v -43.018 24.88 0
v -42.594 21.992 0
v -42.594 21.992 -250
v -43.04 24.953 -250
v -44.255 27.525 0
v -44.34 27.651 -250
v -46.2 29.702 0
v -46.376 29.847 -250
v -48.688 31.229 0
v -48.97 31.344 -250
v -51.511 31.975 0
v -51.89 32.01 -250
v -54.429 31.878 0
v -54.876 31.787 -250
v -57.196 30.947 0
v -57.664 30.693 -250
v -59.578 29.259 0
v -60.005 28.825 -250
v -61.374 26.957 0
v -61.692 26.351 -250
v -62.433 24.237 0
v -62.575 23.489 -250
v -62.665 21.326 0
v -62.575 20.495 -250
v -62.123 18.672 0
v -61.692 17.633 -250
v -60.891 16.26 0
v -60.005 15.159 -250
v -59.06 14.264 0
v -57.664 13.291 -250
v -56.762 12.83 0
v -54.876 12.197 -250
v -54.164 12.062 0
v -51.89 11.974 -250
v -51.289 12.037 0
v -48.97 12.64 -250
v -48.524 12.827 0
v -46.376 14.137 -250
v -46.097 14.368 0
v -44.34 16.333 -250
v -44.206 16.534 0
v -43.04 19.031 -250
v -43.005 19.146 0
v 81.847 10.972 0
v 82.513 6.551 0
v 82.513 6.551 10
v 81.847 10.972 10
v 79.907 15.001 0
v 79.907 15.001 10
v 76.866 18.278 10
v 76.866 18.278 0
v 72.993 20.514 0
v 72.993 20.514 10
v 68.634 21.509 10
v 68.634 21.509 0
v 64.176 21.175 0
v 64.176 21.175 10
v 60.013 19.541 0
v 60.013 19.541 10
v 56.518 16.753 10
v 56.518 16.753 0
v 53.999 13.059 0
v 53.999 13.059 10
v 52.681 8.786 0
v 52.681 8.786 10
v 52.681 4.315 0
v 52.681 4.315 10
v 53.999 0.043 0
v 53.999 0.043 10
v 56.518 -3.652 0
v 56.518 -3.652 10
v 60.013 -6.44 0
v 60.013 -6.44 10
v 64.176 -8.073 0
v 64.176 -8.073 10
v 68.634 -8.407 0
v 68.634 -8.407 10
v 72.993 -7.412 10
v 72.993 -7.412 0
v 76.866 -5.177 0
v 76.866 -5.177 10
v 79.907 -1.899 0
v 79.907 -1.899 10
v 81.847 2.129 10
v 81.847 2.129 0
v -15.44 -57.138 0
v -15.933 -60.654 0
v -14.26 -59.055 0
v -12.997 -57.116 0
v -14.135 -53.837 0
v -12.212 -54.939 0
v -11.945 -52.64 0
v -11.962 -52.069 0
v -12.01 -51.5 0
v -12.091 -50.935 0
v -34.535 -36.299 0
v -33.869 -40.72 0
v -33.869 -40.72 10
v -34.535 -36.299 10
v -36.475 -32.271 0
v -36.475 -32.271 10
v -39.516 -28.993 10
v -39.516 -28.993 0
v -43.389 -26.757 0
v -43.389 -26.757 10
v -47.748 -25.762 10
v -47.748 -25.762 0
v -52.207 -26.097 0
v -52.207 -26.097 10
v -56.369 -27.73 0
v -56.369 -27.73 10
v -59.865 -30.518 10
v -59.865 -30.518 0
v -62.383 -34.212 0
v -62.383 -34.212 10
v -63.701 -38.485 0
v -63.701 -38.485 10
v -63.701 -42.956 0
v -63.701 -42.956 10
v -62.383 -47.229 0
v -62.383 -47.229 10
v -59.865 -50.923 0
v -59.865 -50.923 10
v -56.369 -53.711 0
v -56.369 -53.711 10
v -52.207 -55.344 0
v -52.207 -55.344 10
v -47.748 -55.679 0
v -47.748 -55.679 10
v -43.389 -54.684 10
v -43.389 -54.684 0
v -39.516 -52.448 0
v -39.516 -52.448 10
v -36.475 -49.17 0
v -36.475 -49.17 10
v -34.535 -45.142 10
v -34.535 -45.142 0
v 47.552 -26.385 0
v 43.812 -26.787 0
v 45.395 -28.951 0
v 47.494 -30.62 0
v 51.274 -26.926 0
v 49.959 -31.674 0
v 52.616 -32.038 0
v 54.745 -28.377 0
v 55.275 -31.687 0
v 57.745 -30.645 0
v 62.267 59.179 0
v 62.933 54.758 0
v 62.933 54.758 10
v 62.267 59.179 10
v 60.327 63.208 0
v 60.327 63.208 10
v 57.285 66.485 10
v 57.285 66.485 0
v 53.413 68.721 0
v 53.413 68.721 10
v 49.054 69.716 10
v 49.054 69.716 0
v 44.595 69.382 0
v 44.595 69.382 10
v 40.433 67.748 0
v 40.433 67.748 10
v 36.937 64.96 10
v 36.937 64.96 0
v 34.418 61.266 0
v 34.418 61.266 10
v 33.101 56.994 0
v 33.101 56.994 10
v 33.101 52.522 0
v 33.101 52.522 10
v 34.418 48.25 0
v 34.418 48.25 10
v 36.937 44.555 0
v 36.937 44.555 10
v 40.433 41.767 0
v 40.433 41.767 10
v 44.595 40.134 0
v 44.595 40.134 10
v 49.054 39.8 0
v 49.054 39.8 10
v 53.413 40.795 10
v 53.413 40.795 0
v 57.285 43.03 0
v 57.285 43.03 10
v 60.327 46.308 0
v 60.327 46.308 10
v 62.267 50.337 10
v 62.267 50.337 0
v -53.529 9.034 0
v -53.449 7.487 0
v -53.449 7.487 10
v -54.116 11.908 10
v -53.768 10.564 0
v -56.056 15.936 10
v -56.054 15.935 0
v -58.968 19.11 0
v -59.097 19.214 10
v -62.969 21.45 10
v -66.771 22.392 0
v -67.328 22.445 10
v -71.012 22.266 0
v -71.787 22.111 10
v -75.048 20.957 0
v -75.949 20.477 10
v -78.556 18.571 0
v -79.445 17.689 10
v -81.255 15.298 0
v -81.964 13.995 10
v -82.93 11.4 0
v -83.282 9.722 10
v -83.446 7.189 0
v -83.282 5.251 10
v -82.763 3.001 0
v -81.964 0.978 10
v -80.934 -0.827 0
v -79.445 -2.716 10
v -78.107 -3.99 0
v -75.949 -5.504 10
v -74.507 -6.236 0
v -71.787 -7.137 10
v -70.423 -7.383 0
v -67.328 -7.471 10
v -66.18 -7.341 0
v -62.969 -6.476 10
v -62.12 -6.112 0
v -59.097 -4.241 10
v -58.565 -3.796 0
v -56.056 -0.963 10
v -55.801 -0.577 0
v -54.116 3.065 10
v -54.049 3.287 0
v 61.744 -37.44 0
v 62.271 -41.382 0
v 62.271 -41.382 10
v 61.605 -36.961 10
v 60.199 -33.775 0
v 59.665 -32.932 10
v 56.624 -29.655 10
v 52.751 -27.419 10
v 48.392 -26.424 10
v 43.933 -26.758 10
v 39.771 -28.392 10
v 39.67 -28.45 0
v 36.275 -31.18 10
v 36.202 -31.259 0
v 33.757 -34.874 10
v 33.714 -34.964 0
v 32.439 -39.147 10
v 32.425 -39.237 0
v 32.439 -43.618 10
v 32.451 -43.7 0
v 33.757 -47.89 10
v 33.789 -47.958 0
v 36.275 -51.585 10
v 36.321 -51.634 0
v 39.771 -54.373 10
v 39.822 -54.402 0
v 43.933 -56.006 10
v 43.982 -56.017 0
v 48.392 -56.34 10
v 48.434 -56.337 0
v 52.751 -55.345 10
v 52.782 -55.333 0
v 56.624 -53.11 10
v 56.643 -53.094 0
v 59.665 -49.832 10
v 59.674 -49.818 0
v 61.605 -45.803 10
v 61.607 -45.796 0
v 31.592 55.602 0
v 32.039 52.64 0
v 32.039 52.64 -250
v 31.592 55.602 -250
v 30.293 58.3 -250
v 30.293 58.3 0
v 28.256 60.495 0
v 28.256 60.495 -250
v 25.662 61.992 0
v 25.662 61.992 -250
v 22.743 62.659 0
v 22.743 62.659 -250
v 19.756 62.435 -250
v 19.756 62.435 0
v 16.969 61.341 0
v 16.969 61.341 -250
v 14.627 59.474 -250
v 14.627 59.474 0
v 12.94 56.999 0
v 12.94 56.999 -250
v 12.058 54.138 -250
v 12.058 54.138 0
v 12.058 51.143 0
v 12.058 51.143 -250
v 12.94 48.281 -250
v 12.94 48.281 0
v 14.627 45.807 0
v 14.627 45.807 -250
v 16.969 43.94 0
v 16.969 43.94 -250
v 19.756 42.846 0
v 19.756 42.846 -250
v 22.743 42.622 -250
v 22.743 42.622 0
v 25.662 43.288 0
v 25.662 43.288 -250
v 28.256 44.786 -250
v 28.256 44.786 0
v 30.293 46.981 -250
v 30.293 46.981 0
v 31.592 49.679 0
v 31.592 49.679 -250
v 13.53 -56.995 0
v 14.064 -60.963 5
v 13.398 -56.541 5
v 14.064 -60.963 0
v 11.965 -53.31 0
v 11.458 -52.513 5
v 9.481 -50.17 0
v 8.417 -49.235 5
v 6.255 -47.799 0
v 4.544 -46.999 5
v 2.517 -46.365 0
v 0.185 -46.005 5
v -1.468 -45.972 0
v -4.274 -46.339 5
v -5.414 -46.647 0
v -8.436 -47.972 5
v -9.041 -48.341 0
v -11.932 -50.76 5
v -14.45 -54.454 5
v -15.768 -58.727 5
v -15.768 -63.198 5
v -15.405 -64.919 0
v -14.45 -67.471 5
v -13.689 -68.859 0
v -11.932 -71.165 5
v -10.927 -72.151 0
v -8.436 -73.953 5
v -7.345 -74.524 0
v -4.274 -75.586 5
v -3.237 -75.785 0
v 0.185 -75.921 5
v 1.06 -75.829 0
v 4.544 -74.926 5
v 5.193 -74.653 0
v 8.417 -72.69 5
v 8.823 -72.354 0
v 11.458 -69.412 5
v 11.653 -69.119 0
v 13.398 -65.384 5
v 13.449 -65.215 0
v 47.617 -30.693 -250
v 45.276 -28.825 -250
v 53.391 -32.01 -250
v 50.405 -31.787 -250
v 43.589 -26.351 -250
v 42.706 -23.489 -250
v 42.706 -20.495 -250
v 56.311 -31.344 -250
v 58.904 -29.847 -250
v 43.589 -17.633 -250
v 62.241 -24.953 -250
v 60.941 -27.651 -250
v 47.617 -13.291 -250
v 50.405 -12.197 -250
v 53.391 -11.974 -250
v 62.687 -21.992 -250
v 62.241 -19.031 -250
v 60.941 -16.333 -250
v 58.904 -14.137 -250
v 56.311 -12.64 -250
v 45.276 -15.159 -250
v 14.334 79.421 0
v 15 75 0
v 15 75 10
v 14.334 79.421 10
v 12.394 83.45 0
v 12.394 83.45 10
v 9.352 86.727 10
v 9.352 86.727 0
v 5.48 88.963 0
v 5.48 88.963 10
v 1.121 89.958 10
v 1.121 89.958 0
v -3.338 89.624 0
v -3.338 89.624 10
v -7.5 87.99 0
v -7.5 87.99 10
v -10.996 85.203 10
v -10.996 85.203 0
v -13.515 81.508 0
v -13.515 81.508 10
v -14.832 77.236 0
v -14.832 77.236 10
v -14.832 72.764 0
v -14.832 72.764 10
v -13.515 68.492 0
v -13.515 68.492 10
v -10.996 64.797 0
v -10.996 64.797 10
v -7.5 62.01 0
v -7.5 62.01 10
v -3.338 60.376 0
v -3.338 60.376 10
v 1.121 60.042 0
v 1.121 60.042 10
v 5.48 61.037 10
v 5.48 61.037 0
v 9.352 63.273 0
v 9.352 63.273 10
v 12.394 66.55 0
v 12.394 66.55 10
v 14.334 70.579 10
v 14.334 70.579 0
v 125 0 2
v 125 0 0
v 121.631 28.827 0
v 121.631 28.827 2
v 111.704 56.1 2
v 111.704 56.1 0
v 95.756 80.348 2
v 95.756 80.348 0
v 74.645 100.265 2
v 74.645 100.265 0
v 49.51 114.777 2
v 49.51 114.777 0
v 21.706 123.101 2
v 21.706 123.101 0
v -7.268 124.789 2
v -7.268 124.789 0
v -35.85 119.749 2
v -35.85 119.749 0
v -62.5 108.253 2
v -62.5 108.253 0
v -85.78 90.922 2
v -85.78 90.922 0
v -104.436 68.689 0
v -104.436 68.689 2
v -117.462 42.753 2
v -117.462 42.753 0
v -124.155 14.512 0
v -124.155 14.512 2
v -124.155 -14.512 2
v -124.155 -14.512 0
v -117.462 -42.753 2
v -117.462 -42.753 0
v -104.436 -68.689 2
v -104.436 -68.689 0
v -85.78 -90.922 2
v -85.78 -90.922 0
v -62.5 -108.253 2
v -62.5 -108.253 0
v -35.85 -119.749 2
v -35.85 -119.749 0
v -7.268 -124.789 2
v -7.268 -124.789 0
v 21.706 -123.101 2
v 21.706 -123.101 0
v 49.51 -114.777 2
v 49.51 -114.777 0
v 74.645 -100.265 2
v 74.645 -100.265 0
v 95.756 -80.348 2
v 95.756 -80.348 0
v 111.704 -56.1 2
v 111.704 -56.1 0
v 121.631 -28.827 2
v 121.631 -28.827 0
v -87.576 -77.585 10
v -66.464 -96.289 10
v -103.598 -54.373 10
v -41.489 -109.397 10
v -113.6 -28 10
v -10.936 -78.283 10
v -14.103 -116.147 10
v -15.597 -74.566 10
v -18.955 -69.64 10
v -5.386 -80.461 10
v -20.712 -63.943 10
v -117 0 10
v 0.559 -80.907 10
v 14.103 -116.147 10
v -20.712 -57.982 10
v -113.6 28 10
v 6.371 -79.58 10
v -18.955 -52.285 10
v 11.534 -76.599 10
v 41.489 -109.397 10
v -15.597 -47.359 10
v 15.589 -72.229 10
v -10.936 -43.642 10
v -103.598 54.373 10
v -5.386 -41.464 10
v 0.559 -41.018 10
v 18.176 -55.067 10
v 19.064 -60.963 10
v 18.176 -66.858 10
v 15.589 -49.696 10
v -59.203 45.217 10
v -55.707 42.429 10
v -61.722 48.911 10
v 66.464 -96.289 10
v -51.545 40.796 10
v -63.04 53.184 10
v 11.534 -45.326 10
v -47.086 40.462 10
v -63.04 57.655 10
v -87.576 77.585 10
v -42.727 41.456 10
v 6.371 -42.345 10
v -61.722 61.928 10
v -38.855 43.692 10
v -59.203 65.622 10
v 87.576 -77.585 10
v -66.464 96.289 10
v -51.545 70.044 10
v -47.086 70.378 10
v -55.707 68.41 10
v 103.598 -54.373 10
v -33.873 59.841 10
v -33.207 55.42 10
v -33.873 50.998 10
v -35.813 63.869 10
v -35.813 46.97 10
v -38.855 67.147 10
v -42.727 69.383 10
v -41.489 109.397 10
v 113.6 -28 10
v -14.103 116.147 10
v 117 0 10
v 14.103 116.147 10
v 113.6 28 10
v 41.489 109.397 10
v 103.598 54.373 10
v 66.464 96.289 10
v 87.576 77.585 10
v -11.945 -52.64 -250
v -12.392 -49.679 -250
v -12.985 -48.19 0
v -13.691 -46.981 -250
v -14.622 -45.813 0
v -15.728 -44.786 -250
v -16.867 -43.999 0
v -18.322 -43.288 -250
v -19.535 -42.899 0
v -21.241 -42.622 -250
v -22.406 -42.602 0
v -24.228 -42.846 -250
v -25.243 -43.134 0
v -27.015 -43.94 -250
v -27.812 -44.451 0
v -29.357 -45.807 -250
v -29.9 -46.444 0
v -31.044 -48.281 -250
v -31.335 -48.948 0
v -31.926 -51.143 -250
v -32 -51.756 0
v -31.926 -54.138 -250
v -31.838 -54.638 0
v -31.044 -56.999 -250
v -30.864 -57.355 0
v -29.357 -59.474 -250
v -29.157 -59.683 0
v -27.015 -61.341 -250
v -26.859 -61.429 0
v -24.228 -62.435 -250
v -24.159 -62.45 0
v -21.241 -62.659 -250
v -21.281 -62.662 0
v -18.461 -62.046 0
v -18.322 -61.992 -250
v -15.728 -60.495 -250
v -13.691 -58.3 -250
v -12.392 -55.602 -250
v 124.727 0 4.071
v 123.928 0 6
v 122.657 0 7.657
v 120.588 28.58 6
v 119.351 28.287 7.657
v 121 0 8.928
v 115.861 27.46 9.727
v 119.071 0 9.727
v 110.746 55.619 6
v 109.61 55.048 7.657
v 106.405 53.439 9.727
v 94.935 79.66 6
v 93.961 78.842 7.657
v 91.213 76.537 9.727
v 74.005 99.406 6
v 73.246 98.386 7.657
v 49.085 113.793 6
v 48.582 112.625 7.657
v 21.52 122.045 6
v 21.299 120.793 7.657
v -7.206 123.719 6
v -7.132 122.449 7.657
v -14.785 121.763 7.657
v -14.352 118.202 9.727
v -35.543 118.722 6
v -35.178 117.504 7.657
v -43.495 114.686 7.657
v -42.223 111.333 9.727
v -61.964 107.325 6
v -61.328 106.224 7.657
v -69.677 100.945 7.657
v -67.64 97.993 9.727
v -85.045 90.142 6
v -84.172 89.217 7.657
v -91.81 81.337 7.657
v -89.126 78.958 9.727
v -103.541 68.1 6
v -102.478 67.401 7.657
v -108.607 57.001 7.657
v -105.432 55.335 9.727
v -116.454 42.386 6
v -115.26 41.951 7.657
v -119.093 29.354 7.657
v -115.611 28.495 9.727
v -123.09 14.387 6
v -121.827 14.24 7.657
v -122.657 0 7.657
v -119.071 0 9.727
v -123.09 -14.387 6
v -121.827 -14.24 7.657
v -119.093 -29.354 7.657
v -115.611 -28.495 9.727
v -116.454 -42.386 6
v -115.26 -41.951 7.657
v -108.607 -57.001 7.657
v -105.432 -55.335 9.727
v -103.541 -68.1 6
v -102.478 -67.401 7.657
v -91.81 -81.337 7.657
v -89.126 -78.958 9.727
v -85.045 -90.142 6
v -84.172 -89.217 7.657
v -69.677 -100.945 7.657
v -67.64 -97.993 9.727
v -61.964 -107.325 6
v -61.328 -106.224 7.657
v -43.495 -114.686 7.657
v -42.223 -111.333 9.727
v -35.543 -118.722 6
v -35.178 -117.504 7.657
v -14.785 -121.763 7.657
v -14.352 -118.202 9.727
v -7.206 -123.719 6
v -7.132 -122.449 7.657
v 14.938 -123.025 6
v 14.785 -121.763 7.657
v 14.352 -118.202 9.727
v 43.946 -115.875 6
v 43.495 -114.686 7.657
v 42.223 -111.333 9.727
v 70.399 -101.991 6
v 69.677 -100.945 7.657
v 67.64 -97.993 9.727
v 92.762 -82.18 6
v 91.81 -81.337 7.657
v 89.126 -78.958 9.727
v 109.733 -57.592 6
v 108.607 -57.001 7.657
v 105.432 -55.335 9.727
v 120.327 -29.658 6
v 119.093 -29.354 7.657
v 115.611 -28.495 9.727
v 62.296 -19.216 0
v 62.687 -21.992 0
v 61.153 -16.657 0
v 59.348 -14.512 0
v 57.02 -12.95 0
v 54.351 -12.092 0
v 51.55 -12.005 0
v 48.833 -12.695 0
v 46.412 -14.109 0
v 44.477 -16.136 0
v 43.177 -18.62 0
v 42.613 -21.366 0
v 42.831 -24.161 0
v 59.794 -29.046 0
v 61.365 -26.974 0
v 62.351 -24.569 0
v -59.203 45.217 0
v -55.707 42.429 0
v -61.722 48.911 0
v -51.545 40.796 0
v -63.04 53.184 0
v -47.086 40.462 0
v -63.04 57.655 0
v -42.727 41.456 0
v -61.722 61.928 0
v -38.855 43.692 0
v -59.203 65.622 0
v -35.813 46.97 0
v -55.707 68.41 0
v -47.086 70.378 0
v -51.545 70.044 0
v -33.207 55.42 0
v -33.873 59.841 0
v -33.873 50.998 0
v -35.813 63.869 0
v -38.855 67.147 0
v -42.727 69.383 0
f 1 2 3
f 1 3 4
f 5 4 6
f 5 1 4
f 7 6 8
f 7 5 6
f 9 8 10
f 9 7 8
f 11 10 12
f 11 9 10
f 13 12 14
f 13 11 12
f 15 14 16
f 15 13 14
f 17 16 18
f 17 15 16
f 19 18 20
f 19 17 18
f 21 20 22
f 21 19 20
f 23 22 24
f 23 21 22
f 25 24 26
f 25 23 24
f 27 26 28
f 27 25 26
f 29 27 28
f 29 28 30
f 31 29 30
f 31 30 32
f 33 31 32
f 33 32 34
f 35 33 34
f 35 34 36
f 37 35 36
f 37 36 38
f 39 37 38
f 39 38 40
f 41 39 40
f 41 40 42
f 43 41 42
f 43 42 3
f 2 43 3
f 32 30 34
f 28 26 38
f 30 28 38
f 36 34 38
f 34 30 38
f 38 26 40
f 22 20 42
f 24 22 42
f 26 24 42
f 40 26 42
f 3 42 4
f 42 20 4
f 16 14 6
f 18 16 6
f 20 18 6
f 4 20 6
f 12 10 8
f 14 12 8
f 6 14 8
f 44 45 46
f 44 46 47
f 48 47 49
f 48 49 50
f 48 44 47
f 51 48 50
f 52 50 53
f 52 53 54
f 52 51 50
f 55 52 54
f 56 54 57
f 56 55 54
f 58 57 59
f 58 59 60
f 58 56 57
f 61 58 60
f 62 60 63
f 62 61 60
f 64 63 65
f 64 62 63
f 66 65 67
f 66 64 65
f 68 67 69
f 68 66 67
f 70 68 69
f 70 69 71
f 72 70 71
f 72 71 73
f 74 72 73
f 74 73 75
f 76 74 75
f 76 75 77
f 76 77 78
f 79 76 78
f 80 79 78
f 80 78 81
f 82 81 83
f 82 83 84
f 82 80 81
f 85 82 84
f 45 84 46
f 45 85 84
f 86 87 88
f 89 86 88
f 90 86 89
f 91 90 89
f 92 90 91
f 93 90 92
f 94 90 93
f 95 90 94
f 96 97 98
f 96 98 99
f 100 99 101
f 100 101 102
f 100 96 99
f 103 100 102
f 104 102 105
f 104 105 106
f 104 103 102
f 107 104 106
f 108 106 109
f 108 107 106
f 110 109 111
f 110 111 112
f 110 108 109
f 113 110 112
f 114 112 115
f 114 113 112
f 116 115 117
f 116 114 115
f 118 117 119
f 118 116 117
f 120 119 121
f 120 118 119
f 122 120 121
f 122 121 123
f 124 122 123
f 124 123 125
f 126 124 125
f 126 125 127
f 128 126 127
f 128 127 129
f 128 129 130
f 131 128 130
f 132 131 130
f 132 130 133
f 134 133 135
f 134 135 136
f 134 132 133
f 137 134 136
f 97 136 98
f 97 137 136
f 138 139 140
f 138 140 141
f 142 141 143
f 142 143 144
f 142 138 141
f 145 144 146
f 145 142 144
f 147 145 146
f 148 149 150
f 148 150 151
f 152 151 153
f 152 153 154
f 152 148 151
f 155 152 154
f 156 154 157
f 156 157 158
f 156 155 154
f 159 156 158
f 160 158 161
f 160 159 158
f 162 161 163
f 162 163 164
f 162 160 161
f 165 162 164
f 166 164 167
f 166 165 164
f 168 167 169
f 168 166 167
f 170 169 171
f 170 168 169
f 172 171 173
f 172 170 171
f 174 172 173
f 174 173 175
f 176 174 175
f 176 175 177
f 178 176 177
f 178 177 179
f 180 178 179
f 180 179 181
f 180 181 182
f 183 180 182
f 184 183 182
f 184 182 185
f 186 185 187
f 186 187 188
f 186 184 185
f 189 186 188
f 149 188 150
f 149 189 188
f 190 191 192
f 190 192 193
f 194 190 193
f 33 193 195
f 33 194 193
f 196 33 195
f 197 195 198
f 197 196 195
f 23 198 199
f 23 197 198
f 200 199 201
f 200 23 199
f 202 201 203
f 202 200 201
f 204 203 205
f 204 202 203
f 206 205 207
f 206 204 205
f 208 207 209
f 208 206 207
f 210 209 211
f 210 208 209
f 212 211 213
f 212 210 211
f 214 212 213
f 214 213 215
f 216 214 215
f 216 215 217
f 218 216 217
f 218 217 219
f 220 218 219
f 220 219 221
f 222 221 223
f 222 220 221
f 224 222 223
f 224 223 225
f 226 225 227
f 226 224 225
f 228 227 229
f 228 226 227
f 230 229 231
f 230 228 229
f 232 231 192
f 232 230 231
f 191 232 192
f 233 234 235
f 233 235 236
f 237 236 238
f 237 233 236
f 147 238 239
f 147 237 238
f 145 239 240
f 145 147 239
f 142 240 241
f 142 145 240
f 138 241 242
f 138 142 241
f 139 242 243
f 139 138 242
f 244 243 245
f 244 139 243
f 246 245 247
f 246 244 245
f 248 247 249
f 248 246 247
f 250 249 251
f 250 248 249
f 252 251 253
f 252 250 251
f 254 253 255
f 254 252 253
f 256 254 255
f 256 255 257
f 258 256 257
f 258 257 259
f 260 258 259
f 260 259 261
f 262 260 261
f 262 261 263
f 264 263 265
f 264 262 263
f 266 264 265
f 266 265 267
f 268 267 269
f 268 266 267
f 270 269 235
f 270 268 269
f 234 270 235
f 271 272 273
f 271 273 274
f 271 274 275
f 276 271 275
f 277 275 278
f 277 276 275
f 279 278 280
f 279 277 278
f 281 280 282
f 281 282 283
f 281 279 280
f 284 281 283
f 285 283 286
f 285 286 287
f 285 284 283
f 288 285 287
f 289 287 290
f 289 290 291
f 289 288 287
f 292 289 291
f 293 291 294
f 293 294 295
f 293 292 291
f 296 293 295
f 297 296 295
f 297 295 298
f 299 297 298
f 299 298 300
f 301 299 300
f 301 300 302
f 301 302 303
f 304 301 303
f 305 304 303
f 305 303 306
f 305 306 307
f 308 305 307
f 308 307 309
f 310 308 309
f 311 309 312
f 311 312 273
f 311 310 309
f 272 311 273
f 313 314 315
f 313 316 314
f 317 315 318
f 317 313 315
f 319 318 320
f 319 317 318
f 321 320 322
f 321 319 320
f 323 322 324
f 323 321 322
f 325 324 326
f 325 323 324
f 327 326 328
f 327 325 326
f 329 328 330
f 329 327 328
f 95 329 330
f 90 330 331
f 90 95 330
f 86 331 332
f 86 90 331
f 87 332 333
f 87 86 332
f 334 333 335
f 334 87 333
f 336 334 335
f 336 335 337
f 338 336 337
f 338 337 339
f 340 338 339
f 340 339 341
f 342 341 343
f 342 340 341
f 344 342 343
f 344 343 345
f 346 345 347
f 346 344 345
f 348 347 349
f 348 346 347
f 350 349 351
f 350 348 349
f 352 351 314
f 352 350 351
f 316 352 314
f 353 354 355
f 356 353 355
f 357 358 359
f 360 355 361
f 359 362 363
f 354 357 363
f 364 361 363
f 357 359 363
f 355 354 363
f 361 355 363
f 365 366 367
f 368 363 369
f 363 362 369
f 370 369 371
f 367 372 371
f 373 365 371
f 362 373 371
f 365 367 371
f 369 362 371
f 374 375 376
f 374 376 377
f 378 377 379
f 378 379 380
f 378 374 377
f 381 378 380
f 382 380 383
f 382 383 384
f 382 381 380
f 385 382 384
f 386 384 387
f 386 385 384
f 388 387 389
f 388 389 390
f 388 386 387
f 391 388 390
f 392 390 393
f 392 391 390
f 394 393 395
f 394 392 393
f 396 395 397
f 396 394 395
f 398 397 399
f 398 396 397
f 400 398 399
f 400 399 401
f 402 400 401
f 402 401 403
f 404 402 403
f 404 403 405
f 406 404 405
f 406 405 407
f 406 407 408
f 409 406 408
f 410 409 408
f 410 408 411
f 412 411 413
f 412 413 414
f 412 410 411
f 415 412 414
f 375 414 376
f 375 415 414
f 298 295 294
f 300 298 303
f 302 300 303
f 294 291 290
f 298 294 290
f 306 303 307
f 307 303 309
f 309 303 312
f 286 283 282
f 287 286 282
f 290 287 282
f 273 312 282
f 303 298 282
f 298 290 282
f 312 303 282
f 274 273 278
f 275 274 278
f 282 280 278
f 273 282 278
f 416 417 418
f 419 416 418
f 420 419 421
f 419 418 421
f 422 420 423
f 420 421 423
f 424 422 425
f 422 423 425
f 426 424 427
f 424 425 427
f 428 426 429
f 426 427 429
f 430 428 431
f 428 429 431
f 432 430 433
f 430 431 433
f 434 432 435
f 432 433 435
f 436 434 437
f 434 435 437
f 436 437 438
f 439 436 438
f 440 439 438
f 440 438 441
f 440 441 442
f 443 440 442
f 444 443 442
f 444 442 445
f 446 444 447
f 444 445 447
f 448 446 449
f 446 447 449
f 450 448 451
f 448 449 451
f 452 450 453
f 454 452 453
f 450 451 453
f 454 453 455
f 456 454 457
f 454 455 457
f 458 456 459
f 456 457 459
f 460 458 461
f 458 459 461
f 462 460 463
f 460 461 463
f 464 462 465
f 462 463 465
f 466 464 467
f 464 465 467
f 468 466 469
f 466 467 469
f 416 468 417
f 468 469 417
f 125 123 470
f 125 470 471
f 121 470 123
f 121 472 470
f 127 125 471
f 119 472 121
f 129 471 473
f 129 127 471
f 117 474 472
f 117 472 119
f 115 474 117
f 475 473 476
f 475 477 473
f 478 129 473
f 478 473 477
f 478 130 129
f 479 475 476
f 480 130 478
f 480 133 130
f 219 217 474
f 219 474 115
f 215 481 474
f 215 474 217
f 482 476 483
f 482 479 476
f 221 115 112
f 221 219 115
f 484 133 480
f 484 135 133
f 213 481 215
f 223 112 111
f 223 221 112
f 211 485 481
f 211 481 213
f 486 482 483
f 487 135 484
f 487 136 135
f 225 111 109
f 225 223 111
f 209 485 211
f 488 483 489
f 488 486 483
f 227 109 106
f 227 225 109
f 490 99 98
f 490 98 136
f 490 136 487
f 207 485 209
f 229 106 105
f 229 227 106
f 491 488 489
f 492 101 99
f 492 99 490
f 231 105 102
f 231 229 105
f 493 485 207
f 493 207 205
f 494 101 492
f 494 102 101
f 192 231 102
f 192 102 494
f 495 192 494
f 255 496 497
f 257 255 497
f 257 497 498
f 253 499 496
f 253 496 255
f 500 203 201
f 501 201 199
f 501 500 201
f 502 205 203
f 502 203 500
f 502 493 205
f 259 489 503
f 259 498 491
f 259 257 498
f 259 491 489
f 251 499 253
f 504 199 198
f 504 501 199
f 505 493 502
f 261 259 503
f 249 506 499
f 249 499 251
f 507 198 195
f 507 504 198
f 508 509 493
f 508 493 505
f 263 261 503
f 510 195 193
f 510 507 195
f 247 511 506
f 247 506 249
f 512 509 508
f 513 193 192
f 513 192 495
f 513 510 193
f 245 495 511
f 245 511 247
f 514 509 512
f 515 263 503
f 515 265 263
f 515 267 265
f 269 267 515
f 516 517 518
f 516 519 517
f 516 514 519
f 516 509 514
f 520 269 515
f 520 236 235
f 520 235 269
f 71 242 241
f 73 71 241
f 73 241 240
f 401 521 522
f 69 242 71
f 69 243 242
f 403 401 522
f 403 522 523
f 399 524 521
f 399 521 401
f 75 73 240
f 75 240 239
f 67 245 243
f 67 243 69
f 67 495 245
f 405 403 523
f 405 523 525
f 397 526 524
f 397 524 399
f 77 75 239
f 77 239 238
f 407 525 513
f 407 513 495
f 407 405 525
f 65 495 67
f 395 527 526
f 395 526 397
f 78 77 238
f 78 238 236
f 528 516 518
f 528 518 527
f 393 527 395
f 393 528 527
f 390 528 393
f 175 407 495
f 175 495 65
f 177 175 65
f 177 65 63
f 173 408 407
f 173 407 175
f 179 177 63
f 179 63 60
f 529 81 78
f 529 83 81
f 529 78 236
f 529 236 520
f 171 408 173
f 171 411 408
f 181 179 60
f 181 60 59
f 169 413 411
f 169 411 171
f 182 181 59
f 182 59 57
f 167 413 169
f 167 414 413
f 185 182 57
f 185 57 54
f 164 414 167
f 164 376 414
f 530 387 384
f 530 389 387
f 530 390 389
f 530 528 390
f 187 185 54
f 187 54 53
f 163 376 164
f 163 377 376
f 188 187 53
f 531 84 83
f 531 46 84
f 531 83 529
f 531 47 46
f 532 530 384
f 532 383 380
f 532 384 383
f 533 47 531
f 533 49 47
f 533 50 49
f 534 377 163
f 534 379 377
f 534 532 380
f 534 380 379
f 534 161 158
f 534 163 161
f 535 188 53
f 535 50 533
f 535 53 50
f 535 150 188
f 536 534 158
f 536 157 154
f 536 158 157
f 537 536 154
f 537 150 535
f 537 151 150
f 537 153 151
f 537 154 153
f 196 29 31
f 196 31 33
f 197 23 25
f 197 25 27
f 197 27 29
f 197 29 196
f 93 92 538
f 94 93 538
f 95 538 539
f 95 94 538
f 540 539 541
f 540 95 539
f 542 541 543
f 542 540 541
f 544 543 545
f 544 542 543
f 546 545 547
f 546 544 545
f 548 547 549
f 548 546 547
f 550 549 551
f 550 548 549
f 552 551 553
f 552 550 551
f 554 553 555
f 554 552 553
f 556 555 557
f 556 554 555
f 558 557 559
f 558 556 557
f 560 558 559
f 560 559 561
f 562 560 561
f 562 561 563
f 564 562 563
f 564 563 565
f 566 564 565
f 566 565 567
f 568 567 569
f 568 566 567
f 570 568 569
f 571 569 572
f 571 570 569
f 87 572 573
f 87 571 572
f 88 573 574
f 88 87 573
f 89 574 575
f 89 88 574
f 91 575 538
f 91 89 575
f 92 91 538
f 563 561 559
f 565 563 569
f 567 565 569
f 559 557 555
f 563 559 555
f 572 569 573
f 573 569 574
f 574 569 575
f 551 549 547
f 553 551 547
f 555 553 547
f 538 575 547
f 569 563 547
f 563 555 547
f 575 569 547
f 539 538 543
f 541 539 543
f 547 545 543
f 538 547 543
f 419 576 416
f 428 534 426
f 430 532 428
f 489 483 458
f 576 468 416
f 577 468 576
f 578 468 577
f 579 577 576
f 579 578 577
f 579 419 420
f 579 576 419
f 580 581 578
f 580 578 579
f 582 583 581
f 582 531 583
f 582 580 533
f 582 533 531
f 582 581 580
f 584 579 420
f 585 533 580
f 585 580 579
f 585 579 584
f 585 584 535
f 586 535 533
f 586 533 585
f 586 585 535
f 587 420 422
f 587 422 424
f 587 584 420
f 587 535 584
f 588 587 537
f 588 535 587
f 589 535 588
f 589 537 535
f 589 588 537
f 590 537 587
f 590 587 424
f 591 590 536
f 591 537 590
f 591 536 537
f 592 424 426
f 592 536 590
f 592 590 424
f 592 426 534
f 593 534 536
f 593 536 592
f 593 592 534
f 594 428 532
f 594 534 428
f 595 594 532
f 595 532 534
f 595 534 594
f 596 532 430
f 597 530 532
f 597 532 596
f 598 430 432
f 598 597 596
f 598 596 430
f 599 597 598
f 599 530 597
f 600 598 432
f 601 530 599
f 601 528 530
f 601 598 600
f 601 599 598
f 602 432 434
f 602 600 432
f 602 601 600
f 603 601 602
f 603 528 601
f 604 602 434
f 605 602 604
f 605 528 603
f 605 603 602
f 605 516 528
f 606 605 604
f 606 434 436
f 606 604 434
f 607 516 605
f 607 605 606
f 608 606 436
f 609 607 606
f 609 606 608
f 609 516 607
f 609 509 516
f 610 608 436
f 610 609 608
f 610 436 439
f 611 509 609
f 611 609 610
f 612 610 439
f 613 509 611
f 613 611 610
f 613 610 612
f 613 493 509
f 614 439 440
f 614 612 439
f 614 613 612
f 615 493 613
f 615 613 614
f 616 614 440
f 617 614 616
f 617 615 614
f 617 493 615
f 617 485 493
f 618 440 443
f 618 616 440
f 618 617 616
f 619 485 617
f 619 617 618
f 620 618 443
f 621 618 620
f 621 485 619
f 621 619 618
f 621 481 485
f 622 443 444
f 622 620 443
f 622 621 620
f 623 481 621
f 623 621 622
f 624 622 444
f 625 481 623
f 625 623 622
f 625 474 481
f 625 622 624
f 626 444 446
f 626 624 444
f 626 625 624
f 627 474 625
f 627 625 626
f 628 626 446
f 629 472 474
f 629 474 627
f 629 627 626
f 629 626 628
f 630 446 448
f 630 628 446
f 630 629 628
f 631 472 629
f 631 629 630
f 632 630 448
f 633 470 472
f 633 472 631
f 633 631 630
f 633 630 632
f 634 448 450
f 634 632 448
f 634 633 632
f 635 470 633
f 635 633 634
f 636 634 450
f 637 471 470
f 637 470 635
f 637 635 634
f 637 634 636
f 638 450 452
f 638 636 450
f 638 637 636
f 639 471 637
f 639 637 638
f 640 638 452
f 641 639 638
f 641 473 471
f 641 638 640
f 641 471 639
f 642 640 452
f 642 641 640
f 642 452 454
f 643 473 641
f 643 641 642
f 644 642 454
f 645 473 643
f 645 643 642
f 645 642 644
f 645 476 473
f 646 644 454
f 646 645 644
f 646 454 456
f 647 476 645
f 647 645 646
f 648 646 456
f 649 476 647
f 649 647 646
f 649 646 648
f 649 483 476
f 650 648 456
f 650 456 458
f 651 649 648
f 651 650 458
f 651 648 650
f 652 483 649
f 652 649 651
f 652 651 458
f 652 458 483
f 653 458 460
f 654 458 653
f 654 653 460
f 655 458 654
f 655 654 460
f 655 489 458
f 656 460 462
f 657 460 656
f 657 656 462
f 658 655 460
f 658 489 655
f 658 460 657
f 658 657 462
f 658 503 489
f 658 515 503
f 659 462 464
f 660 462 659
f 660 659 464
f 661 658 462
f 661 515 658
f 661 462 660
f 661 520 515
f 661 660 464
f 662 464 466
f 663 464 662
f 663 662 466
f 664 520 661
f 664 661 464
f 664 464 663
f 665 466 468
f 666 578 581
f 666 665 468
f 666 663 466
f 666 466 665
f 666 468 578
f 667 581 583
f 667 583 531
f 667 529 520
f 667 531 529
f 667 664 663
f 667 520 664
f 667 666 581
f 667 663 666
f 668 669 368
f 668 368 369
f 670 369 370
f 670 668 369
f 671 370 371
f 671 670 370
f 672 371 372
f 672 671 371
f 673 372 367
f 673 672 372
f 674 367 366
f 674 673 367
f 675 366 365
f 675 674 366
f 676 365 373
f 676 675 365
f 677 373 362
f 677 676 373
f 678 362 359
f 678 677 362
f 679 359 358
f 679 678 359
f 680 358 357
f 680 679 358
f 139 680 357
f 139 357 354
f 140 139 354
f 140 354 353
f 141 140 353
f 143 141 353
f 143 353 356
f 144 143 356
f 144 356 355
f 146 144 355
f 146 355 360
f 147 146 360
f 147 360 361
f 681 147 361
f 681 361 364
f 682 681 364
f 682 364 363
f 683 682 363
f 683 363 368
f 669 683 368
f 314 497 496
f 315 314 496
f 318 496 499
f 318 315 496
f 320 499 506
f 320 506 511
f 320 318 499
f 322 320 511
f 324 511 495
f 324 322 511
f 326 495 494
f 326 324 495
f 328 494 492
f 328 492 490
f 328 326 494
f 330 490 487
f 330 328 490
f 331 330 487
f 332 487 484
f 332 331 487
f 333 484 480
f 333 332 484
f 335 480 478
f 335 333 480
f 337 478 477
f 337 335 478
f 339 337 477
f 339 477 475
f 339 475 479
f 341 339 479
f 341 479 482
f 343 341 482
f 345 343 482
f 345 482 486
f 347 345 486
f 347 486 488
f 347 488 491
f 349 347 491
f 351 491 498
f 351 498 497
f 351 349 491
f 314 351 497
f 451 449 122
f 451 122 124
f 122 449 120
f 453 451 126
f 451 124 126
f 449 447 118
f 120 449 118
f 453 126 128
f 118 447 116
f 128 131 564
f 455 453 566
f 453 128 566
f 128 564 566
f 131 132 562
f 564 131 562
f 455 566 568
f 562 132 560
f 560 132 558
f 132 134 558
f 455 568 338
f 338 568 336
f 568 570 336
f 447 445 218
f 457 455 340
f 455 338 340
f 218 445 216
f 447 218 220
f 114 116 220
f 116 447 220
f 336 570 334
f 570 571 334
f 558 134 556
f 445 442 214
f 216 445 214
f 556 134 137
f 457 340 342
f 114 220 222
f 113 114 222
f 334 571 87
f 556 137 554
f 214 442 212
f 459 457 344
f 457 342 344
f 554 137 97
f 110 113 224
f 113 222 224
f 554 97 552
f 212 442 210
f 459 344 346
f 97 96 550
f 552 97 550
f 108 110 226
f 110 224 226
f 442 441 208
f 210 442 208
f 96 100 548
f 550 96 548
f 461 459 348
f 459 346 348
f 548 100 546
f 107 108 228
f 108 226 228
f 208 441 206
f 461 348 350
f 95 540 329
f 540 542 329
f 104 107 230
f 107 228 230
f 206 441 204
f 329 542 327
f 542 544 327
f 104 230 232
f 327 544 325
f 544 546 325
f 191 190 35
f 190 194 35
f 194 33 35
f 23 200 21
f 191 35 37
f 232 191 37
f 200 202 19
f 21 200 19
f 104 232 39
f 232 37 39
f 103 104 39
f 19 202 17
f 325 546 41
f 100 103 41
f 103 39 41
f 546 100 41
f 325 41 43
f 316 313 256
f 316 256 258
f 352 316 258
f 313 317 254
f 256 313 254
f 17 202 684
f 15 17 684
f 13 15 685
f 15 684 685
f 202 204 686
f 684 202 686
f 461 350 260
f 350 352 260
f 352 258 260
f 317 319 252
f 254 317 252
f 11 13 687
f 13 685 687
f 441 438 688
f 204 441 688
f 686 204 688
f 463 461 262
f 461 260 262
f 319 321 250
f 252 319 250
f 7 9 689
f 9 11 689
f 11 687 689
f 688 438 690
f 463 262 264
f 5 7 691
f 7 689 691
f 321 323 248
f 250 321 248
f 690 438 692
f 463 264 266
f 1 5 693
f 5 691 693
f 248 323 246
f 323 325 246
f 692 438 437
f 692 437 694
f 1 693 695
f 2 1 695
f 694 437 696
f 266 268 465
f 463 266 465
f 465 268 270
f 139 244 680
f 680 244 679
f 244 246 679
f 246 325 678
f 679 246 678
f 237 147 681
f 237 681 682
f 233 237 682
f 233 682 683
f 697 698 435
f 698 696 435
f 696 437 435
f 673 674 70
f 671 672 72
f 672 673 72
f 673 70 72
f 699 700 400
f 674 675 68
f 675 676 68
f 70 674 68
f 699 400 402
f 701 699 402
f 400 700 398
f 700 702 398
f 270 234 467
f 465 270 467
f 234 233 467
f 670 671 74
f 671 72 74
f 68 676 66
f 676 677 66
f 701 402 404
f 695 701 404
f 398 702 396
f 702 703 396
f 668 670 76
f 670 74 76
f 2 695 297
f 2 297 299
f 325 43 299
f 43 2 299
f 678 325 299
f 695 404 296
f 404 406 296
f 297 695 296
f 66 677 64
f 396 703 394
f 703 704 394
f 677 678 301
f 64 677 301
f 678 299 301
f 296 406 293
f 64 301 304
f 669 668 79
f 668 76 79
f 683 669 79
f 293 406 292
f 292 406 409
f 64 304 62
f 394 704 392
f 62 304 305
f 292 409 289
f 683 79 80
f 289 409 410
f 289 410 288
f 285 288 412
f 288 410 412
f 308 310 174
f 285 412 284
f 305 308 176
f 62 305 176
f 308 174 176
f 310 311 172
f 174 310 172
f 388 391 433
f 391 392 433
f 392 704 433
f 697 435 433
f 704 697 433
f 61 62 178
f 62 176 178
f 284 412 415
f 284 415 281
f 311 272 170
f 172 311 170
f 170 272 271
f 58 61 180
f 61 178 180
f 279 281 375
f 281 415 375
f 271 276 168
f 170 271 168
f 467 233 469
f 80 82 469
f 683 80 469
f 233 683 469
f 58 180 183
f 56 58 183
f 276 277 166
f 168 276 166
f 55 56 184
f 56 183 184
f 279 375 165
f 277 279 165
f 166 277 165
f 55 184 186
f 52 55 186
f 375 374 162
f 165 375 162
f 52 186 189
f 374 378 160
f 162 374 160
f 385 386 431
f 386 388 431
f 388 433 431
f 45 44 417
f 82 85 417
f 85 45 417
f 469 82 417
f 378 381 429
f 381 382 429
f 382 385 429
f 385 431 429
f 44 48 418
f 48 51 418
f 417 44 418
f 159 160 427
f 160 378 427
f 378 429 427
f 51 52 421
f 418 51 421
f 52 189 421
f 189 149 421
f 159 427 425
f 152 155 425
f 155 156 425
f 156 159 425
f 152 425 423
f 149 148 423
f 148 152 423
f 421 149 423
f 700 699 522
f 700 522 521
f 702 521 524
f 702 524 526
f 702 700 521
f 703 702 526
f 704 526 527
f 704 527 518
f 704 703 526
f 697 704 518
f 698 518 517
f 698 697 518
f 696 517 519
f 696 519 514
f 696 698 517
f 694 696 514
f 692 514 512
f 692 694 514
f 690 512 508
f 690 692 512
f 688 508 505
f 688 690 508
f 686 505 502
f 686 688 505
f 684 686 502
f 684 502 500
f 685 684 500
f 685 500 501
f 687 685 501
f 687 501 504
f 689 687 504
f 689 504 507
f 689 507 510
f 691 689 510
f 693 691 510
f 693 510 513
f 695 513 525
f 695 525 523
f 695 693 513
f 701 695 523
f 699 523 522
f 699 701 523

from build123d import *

# Parameters (mm, degrees)
F1_R     = 125
F1_R_2   = 15
F2_DEPTH = 10
F3_R     = 8
F4_SIZE  = 5
F5_R     = 10.046547
F6_DEPTH = 250
F7_DEPTH = 250


with BuildPart() as f2:
    # F1 (on face) → F2 (new body)
    with BuildSketch(Plane.XY):
        Circle(F1_R)
        with Locations((-48.868799, -40.720446)):
            Circle(F1_R_2, mode=Mode.SUBTRACT)
        with Locations((-0.93582, -60.962566)):
            Circle(F1_R_2, mode=Mode.SUBTRACT)
        with Locations((47.271254, -41.382171)):
            Circle(F1_R_2, mode=Mode.SUBTRACT)
        with Locations((-68.449193, 7.486627)):
            Circle(F1_R_2, mode=Mode.SUBTRACT)
        with Locations((-48.207074, 55.419606)):
            Circle(F1_R_2, mode=Mode.SUBTRACT)
        with Locations((47.932978, 54.757881)):
            Circle(F1_R_2, mode=Mode.SUBTRACT)
        with Locations((67.513373, 6.550807)):
            Circle(F1_R_2, mode=Mode.SUBTRACT)
        with Locations((0, 75)):
            Circle(F1_R_2, mode=Mode.SUBTRACT)
    extrude(amount=F2_DEPTH)

    # F3
    f3_edges = [f2.edges().sort_by_distance(p)[0] for p in [
        (-125, 0, 10),
    ]]
    fillet(f3_edges, radius=F3_R)

    # F4
    f4_edges = [f2.edges().sort_by_distance(p)[0] for p in [
        (-15.93582, -60.962566, 10),
    ]]
    chamfer(f4_edges, length=F4_SIZE)

    # F5 (on face) → F6 (join)
    with BuildSketch(Plane.XY):
        with Locations((52.640375, -21.991979)):
            Circle(F5_R)
    extrude(amount=-F6_DEPTH)

    # F5 (on face) → F7 (join)
    with BuildSketch(Plane.XY):
        with Locations((-21.991979, -52.640375)):
            Circle(F5_R)
        with Locations((52.640375, -21.991979)):
            Circle(F5_R)
        with Locations((21.991979, 52.640375)):
            Circle(F5_R)
        with Locations((-52.640375, 21.991979)):
            Circle(F5_R)
    extrude(amount=-F7_DEPTH)


solid = f2.part
